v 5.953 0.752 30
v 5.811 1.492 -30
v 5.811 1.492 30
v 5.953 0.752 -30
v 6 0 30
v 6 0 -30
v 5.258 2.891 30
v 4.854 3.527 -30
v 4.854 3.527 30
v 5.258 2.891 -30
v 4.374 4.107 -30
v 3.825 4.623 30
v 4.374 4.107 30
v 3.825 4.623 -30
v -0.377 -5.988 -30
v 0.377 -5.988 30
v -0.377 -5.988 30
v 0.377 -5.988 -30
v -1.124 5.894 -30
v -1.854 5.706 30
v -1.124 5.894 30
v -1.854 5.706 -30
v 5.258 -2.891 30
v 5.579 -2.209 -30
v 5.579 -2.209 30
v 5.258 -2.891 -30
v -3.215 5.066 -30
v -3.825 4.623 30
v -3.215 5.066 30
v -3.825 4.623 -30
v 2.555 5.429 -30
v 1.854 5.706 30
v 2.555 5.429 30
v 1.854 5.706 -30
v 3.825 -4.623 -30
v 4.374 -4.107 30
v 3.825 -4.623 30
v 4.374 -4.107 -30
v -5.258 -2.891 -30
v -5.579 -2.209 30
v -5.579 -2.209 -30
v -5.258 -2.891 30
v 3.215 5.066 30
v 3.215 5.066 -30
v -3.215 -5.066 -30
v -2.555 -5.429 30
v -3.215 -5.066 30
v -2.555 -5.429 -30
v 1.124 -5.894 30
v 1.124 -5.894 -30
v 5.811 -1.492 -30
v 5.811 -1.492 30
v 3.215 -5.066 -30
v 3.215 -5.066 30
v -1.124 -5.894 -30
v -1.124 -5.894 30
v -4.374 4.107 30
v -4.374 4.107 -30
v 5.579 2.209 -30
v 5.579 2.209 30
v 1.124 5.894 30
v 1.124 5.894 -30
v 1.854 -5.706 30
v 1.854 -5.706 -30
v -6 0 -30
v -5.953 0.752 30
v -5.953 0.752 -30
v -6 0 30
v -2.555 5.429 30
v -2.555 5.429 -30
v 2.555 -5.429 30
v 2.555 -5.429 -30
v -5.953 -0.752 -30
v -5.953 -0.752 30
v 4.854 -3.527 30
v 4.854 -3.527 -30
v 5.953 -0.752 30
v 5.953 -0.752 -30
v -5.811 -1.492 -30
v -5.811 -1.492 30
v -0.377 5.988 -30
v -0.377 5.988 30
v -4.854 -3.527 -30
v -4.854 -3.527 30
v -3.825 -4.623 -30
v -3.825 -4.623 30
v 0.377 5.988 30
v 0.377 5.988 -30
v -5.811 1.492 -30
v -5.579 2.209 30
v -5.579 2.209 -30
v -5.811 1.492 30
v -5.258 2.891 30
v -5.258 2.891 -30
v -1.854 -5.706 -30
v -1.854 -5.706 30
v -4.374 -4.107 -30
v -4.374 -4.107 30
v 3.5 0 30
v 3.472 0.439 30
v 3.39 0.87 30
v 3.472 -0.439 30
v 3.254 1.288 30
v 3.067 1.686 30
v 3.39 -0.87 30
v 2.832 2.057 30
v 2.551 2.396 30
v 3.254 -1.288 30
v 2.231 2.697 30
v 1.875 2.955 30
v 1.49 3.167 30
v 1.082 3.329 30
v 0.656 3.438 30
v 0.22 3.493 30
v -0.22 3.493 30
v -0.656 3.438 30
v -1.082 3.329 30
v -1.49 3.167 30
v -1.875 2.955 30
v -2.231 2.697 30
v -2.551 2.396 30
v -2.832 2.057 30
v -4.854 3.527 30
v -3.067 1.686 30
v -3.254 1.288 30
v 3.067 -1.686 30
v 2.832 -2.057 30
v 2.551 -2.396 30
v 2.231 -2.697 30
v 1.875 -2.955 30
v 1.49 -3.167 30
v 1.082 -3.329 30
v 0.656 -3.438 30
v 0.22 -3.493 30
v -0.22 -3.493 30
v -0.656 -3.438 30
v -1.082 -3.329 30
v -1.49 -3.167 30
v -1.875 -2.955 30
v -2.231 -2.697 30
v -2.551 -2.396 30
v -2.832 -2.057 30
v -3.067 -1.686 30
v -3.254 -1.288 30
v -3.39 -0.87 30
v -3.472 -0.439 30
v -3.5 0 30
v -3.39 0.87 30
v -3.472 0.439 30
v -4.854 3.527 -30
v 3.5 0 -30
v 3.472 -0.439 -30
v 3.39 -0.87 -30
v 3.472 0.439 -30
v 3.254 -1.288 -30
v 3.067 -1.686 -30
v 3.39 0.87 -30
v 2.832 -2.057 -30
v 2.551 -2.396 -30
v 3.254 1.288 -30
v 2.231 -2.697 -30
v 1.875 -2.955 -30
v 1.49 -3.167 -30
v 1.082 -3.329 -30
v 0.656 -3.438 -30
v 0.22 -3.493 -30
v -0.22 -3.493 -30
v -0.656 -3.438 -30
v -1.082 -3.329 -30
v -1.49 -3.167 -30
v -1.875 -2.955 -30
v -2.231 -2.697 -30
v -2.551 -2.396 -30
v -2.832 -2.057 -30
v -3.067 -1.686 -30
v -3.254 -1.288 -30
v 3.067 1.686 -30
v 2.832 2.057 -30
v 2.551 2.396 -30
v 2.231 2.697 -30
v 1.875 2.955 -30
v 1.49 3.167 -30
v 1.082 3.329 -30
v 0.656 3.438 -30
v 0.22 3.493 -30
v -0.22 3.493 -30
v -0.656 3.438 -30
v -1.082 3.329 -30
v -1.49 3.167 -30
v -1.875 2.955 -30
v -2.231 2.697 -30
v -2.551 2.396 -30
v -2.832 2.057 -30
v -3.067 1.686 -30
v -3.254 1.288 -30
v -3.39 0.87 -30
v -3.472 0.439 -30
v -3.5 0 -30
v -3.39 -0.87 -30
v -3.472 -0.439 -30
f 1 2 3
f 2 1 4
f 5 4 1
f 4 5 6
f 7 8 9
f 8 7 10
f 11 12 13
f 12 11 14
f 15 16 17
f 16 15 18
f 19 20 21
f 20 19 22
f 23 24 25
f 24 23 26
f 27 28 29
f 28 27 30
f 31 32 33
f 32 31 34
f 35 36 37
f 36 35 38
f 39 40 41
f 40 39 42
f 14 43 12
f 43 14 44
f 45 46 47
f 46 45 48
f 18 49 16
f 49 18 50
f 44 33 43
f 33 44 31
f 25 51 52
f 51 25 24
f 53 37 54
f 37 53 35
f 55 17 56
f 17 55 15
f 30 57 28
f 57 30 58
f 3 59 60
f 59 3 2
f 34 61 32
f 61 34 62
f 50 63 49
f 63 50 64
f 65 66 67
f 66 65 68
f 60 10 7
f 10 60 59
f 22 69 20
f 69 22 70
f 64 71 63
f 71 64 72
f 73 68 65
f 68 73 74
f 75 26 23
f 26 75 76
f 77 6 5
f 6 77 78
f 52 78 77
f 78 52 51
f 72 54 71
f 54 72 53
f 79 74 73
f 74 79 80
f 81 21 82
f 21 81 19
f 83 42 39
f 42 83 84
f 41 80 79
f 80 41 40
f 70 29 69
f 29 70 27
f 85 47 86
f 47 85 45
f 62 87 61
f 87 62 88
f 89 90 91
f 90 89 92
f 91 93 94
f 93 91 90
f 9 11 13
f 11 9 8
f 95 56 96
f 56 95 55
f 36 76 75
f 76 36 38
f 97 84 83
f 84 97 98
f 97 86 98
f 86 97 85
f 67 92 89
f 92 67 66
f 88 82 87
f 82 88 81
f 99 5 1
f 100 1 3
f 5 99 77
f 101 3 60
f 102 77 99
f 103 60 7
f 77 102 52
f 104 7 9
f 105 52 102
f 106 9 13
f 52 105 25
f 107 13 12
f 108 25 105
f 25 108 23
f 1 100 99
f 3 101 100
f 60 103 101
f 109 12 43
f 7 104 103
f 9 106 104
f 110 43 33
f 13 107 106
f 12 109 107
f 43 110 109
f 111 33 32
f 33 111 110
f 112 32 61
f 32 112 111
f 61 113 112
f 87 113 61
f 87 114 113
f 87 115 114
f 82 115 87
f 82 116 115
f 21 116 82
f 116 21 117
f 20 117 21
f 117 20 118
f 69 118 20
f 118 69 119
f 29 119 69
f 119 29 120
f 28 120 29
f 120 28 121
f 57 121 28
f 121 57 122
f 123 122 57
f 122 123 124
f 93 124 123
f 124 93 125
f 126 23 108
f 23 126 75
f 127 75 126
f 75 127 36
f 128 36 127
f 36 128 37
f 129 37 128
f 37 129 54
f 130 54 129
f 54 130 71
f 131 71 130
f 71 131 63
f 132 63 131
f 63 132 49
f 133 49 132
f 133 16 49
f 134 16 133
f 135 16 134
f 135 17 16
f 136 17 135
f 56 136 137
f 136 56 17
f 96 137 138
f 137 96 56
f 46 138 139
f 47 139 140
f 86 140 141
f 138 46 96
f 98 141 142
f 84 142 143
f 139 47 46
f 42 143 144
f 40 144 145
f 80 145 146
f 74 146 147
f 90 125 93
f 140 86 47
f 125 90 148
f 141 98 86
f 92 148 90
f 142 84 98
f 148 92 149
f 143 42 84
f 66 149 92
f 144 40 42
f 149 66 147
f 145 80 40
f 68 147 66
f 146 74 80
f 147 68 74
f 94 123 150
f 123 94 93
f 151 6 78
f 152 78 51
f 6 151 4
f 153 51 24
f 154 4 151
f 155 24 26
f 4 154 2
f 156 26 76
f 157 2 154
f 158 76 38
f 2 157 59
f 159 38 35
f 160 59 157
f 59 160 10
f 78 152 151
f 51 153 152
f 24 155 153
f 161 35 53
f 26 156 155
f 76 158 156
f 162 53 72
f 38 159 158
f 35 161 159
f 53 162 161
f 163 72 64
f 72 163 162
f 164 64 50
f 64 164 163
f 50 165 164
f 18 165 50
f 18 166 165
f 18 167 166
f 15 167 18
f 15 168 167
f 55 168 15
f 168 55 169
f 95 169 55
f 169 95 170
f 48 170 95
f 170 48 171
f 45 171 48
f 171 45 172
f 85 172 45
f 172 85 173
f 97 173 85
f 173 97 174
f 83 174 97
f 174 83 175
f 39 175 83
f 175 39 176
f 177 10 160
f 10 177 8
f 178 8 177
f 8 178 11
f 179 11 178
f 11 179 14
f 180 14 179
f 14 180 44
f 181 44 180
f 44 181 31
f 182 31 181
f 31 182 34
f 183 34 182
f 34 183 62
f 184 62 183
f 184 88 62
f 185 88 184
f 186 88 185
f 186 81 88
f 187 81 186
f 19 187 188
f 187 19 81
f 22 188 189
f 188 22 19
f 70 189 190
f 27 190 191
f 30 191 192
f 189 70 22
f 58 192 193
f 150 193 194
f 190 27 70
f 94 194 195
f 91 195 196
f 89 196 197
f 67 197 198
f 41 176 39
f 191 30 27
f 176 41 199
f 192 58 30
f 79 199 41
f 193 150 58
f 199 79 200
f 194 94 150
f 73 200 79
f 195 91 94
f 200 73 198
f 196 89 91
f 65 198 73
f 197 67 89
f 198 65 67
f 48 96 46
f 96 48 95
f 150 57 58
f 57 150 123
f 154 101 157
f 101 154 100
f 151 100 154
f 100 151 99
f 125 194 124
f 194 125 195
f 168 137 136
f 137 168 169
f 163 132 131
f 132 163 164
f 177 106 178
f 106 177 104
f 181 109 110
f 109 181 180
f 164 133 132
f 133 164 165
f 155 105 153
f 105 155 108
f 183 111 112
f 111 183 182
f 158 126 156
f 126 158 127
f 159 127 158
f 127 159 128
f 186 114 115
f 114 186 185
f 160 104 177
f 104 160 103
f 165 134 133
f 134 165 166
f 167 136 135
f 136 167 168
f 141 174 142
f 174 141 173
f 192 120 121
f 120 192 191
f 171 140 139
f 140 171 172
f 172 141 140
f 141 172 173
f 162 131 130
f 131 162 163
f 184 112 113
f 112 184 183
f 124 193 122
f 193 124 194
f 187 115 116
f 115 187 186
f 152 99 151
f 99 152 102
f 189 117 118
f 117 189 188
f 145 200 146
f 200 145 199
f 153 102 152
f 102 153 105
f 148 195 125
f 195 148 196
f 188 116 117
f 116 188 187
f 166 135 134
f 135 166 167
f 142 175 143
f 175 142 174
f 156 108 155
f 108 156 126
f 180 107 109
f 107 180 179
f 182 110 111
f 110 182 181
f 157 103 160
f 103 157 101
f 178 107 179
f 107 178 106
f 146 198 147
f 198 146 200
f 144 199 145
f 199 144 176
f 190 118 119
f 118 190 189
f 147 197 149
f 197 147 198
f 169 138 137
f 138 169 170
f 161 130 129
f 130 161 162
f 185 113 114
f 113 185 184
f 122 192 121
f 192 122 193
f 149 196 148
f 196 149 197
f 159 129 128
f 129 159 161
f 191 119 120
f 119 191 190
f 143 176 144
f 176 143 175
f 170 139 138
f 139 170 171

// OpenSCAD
$fn = 50;


difference() {
	union() {
		translate(v = [0, 0, -30.0000000000]) {
			cylinder(h = 60, r = 6.0000000000);
		}
	}
	union() {
		translate(v = [0, 0, -100.0000000000]) {
			cylinder(h = 200, r = 3.5000000000);
		}
	}
}
